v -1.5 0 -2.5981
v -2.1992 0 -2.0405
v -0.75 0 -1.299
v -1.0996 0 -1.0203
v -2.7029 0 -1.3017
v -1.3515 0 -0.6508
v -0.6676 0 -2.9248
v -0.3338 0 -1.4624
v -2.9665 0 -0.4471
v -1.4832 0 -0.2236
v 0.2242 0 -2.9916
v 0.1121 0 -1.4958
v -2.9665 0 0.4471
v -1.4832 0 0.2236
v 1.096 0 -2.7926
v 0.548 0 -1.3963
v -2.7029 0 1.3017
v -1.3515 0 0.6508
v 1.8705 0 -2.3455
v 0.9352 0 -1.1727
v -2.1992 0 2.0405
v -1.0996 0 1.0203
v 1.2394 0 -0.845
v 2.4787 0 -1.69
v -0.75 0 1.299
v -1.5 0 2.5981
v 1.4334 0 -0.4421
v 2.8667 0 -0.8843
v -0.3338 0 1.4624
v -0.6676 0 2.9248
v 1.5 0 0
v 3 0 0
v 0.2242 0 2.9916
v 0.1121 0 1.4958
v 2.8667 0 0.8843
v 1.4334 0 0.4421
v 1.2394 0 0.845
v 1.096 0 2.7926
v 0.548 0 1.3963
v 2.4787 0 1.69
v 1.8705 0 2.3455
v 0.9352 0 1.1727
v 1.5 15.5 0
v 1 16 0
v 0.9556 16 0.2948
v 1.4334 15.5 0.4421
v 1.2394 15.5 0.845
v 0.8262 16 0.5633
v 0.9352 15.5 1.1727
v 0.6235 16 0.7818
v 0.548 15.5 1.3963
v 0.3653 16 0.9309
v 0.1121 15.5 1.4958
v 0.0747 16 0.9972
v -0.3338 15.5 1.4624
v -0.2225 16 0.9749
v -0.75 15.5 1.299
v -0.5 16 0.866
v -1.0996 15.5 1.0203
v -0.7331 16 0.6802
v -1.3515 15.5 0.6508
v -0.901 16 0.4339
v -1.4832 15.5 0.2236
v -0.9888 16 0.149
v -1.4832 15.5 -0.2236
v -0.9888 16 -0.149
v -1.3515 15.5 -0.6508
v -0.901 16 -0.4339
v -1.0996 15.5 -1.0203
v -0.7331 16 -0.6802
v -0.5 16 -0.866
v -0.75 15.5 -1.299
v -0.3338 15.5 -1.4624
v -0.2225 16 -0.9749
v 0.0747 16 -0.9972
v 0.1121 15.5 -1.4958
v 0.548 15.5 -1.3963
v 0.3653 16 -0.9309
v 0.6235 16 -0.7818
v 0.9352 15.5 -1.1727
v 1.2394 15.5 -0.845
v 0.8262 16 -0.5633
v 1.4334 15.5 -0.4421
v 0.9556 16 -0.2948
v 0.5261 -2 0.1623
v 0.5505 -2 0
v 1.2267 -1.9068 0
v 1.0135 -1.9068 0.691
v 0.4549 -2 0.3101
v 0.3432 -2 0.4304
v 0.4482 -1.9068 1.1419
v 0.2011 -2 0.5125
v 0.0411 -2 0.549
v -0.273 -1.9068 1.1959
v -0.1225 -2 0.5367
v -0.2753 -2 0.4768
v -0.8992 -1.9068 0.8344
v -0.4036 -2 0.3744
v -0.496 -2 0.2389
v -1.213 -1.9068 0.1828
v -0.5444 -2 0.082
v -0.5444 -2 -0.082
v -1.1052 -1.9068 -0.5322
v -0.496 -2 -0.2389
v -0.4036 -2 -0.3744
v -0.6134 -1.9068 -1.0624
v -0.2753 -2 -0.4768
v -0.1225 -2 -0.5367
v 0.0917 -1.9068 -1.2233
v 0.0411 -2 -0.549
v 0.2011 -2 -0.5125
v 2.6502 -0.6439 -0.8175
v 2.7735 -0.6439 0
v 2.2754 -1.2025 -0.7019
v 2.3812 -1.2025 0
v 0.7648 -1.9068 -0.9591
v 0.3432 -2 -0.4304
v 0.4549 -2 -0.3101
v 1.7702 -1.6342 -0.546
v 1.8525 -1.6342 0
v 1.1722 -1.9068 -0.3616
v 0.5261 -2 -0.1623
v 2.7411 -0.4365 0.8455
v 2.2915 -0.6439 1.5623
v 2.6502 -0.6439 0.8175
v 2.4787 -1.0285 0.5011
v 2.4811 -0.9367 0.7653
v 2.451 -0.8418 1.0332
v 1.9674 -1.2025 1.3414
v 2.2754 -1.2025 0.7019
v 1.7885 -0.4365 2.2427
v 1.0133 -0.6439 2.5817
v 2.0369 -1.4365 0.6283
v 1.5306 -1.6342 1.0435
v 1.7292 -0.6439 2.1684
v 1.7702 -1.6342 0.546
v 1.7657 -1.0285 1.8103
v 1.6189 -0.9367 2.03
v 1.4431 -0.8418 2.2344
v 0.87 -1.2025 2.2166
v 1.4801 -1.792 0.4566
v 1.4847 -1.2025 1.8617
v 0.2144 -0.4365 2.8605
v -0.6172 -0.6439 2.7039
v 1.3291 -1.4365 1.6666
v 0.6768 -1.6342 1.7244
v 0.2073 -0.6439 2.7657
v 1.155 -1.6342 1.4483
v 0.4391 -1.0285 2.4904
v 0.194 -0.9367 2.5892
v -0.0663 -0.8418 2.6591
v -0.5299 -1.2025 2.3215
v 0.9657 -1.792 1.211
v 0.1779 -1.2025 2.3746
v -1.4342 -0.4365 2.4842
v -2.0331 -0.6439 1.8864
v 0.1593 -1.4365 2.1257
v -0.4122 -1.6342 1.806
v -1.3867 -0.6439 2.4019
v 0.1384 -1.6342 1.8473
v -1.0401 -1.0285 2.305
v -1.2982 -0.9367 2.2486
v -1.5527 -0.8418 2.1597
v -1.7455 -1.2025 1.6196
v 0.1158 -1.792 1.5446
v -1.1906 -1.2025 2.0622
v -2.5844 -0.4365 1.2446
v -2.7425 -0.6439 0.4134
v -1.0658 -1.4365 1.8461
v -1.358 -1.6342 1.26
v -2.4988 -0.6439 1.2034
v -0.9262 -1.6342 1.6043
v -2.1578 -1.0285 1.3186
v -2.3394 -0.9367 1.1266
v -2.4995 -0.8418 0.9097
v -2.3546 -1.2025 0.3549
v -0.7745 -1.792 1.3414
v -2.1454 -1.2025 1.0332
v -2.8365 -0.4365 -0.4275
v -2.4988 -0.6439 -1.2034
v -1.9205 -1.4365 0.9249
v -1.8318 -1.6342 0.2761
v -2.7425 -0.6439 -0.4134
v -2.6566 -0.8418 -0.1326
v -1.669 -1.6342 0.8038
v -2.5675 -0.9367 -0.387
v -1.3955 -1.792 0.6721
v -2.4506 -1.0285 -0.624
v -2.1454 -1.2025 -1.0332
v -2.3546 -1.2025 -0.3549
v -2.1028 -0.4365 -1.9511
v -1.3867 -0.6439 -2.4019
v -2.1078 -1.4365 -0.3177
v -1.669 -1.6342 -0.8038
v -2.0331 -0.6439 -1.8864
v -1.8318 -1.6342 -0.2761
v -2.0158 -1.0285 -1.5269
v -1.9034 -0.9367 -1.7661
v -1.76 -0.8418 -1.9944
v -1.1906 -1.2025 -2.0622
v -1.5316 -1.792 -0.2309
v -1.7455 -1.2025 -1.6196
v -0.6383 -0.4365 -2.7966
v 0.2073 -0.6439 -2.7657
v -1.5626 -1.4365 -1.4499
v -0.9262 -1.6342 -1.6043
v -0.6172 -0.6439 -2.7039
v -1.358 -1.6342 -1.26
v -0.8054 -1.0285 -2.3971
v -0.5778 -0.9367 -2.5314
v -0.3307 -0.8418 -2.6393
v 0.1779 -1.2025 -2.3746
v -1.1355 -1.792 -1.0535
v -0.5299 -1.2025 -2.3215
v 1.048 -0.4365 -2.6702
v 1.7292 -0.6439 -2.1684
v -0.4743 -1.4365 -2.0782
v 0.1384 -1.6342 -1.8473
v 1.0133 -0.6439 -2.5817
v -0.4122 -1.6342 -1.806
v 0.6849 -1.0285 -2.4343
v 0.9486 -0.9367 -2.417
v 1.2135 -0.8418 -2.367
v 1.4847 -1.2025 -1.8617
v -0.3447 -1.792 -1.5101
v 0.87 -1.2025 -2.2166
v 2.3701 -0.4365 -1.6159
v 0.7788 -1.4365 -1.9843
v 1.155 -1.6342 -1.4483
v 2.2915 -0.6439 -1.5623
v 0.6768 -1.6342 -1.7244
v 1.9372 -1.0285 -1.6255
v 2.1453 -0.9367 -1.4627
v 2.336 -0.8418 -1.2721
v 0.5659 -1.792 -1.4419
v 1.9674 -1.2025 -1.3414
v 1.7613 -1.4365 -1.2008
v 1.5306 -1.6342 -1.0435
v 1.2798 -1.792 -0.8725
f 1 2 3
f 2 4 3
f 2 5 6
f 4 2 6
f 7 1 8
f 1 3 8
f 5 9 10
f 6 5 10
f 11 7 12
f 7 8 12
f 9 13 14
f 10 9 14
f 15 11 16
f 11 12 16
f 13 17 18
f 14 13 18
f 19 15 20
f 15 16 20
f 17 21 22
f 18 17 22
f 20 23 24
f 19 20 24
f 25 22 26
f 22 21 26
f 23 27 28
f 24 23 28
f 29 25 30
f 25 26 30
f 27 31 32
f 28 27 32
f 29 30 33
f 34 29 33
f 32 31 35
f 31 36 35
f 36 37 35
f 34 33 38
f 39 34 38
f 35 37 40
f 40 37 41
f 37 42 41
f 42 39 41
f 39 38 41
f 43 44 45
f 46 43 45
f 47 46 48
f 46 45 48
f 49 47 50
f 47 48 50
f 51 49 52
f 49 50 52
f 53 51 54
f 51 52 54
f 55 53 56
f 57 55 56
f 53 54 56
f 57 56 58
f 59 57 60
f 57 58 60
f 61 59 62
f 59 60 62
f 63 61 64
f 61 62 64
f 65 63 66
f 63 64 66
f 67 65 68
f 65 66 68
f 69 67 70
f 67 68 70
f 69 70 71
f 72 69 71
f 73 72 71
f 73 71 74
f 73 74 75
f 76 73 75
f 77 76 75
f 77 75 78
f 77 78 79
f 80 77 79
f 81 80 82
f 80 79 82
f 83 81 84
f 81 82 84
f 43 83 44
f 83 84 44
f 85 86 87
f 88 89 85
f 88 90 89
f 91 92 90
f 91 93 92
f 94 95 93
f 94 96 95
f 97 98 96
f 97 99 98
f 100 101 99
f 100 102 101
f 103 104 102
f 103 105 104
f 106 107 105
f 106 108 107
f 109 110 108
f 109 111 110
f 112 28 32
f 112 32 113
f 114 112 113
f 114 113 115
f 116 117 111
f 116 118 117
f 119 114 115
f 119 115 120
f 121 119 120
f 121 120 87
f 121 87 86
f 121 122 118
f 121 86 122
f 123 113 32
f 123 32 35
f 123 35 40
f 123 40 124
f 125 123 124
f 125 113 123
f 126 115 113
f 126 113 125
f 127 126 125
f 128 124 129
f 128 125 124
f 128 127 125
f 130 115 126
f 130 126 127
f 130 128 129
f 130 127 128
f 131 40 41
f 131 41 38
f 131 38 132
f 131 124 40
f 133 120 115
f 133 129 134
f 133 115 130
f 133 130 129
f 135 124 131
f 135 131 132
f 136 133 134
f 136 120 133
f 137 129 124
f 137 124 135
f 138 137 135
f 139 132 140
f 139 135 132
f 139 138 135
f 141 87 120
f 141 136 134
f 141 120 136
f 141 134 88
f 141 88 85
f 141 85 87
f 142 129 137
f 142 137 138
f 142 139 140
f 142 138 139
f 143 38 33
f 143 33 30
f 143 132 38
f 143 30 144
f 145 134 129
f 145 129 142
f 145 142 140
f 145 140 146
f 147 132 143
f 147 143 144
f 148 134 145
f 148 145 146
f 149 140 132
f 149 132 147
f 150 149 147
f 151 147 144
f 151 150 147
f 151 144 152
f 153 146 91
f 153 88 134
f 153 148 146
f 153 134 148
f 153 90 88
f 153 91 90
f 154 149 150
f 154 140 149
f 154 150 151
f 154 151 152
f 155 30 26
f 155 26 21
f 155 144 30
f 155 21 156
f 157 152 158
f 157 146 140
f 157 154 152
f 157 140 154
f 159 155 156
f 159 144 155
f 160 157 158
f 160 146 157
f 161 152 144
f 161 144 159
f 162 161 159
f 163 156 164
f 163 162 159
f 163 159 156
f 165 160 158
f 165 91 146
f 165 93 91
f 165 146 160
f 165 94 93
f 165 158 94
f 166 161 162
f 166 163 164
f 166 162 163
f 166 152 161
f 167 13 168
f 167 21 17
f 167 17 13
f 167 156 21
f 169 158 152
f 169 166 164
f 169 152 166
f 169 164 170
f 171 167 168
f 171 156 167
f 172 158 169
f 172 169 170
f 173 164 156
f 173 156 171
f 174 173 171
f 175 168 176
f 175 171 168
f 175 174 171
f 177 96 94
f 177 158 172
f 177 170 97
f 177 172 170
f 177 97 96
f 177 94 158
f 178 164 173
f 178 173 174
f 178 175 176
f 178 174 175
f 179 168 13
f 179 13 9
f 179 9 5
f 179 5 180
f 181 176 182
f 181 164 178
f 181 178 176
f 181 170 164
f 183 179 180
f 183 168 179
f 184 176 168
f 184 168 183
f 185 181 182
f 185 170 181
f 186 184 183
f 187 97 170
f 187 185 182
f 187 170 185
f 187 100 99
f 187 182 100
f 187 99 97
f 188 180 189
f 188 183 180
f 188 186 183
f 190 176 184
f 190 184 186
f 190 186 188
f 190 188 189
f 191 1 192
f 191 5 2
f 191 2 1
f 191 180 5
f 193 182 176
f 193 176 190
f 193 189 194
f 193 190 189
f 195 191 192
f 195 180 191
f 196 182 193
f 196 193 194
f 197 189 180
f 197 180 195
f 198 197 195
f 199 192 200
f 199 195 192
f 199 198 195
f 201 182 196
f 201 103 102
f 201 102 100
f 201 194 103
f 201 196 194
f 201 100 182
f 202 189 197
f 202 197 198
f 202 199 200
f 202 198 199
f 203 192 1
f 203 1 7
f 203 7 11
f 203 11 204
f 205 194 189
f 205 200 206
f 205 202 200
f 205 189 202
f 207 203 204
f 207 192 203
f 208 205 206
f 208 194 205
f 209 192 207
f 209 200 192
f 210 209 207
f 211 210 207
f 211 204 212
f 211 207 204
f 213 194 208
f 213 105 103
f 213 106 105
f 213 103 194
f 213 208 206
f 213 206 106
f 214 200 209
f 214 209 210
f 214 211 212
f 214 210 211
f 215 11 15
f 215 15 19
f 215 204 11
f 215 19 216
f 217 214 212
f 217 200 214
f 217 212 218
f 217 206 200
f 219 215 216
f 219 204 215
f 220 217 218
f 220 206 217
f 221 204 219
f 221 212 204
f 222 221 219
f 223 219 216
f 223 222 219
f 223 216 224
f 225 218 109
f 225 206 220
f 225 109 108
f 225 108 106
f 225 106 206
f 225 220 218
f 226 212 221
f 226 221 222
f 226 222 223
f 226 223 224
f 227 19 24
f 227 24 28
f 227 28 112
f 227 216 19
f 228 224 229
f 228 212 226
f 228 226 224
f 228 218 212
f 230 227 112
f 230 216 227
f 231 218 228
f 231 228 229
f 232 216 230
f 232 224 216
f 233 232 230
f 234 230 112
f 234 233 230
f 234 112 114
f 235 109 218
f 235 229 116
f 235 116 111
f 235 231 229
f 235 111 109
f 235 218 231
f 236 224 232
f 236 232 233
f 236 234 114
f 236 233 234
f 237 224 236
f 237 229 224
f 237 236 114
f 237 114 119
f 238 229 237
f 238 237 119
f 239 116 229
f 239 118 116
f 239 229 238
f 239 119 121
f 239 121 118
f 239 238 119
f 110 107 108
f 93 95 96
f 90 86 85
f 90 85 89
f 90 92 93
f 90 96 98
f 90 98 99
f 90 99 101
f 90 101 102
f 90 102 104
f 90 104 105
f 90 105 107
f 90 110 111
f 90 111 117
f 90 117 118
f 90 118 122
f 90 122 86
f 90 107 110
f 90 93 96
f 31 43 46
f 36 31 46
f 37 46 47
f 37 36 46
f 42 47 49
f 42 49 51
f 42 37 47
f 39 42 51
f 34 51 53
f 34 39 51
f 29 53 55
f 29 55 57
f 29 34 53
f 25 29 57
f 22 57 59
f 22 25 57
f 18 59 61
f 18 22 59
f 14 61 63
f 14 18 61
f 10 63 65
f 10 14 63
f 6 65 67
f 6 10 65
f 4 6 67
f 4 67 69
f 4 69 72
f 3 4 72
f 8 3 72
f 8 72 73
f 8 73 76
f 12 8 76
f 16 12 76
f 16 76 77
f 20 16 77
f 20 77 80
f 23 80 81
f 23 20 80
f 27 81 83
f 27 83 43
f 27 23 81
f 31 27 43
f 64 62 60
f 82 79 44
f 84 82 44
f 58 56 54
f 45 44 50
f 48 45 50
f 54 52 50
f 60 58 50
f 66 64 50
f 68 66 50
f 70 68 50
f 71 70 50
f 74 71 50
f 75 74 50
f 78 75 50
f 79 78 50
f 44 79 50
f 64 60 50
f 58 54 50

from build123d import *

# Parameters (mm, degrees)
F0_R     = 1.5
F1_DEPTH = 16
F0_R_2   = 3
F2_DEPTH = 2
F4_SIZE  = 0.5


# Not quite as in the source:
# - a fillet or chamfer that OpenCascade refuses, or shapes differently, is made with other operations: its cross-section is extruded or revolved along the edge and cut away or added


with BuildPart() as f1:
    # F0 (on Front) → F1 (new body)
    with BuildSketch(Plane.XZ):
        Circle(F0_R)
    extrude(amount=-F1_DEPTH)

    # F0 (on Front) → F2 (join)
    with BuildSketch(Plane.XZ):
        Circle(F0_R_2)
        Circle(F0_R, mode=Mode.SUBTRACT)
        Circle(F0_R)
    extrude(amount=F2_DEPTH)

    # F3: fillet of radius 2.5 on 1 edges, made by hand

    # F3_s1 → F3_t2 (revolve, cut)
    with BuildSketch(Plane.XY):
        with BuildLine():
            ThreePointArc((3, 0), (2.1316490873, -1.4364916731), (0.5505102572, -2))
            Line((0.5505102572, -2), (3, -2))
            Line((3, -2), (3, 0))
        make_face()
    revolve(axis=Axis((0, -2, 0), (0, -1, 0)), mode=Mode.SUBTRACT)

    # F4
    f4_edges = [f1.edges().sort_by_distance(p)[0] for p in [
        (-1.5, 16, 0),
    ]]
    chamfer(f4_edges, length=F4_SIZE)


solid = f1.part
